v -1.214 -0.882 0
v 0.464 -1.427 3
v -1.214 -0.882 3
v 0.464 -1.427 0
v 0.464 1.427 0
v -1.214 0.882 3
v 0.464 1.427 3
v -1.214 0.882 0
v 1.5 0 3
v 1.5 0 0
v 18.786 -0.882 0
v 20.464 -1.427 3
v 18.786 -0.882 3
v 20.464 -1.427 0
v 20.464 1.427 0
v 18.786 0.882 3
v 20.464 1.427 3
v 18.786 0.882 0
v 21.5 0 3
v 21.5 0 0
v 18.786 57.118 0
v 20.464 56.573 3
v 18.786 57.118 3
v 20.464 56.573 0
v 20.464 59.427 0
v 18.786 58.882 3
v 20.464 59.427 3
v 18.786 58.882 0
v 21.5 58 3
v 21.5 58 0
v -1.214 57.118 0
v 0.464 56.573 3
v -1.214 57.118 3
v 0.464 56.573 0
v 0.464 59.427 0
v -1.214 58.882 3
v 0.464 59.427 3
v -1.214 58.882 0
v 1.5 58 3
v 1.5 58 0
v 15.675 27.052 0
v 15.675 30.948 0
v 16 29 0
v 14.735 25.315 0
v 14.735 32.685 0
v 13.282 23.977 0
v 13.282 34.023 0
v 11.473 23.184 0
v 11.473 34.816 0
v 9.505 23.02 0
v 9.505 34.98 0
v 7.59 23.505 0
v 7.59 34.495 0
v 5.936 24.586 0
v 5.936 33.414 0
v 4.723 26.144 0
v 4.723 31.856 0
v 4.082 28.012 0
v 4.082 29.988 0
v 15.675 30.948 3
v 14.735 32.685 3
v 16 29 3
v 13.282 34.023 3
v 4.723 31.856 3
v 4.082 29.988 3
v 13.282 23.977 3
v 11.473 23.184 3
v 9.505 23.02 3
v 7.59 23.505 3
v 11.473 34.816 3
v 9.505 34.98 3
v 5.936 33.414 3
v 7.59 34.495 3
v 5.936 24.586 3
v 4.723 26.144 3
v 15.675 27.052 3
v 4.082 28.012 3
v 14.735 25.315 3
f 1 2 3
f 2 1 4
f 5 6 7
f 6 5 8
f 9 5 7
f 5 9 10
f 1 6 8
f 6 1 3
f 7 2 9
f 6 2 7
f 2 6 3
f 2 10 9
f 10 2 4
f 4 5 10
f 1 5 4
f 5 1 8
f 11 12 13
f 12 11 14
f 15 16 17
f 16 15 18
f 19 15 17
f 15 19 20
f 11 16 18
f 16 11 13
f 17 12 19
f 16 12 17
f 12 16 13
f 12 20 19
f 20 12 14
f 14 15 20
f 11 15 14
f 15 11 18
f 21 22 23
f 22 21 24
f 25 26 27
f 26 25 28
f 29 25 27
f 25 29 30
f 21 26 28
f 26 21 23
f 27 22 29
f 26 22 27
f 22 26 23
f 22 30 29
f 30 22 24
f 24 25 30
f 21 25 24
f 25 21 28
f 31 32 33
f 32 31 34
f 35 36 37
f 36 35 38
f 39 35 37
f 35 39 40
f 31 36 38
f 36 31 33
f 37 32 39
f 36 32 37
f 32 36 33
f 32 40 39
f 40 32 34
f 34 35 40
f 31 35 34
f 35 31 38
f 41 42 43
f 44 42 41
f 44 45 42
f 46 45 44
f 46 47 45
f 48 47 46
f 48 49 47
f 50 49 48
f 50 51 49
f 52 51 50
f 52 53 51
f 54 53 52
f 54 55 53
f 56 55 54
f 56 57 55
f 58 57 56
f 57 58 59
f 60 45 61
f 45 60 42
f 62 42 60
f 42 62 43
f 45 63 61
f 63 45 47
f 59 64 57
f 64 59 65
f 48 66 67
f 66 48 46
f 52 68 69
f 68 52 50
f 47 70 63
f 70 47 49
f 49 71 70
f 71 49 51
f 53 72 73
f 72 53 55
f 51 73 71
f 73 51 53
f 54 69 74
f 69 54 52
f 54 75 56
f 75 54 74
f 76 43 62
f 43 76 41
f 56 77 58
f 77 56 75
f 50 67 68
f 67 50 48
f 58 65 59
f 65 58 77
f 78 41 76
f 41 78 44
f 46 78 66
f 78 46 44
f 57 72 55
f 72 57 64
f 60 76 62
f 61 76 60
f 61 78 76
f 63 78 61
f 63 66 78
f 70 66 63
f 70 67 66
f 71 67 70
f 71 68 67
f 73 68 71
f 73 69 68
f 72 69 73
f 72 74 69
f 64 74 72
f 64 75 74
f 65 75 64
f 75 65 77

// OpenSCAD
claw_holes = [[0,0,0],[20,0,0],[20,58,0],[0,58,0]];
claw_center_hole = [10,29,0];
claw_plate_thick = 3;

module claw_base(){
	difference(){
		union(){
			for(i=[0:3])
				translate(claw_holes[i])cylinder(r=1.5, h=claw_plate_thick);
			translate(claw_center_hole)cylinder(r=6, h=claw_plate_thick);
		}
	}
}

claw_base();
